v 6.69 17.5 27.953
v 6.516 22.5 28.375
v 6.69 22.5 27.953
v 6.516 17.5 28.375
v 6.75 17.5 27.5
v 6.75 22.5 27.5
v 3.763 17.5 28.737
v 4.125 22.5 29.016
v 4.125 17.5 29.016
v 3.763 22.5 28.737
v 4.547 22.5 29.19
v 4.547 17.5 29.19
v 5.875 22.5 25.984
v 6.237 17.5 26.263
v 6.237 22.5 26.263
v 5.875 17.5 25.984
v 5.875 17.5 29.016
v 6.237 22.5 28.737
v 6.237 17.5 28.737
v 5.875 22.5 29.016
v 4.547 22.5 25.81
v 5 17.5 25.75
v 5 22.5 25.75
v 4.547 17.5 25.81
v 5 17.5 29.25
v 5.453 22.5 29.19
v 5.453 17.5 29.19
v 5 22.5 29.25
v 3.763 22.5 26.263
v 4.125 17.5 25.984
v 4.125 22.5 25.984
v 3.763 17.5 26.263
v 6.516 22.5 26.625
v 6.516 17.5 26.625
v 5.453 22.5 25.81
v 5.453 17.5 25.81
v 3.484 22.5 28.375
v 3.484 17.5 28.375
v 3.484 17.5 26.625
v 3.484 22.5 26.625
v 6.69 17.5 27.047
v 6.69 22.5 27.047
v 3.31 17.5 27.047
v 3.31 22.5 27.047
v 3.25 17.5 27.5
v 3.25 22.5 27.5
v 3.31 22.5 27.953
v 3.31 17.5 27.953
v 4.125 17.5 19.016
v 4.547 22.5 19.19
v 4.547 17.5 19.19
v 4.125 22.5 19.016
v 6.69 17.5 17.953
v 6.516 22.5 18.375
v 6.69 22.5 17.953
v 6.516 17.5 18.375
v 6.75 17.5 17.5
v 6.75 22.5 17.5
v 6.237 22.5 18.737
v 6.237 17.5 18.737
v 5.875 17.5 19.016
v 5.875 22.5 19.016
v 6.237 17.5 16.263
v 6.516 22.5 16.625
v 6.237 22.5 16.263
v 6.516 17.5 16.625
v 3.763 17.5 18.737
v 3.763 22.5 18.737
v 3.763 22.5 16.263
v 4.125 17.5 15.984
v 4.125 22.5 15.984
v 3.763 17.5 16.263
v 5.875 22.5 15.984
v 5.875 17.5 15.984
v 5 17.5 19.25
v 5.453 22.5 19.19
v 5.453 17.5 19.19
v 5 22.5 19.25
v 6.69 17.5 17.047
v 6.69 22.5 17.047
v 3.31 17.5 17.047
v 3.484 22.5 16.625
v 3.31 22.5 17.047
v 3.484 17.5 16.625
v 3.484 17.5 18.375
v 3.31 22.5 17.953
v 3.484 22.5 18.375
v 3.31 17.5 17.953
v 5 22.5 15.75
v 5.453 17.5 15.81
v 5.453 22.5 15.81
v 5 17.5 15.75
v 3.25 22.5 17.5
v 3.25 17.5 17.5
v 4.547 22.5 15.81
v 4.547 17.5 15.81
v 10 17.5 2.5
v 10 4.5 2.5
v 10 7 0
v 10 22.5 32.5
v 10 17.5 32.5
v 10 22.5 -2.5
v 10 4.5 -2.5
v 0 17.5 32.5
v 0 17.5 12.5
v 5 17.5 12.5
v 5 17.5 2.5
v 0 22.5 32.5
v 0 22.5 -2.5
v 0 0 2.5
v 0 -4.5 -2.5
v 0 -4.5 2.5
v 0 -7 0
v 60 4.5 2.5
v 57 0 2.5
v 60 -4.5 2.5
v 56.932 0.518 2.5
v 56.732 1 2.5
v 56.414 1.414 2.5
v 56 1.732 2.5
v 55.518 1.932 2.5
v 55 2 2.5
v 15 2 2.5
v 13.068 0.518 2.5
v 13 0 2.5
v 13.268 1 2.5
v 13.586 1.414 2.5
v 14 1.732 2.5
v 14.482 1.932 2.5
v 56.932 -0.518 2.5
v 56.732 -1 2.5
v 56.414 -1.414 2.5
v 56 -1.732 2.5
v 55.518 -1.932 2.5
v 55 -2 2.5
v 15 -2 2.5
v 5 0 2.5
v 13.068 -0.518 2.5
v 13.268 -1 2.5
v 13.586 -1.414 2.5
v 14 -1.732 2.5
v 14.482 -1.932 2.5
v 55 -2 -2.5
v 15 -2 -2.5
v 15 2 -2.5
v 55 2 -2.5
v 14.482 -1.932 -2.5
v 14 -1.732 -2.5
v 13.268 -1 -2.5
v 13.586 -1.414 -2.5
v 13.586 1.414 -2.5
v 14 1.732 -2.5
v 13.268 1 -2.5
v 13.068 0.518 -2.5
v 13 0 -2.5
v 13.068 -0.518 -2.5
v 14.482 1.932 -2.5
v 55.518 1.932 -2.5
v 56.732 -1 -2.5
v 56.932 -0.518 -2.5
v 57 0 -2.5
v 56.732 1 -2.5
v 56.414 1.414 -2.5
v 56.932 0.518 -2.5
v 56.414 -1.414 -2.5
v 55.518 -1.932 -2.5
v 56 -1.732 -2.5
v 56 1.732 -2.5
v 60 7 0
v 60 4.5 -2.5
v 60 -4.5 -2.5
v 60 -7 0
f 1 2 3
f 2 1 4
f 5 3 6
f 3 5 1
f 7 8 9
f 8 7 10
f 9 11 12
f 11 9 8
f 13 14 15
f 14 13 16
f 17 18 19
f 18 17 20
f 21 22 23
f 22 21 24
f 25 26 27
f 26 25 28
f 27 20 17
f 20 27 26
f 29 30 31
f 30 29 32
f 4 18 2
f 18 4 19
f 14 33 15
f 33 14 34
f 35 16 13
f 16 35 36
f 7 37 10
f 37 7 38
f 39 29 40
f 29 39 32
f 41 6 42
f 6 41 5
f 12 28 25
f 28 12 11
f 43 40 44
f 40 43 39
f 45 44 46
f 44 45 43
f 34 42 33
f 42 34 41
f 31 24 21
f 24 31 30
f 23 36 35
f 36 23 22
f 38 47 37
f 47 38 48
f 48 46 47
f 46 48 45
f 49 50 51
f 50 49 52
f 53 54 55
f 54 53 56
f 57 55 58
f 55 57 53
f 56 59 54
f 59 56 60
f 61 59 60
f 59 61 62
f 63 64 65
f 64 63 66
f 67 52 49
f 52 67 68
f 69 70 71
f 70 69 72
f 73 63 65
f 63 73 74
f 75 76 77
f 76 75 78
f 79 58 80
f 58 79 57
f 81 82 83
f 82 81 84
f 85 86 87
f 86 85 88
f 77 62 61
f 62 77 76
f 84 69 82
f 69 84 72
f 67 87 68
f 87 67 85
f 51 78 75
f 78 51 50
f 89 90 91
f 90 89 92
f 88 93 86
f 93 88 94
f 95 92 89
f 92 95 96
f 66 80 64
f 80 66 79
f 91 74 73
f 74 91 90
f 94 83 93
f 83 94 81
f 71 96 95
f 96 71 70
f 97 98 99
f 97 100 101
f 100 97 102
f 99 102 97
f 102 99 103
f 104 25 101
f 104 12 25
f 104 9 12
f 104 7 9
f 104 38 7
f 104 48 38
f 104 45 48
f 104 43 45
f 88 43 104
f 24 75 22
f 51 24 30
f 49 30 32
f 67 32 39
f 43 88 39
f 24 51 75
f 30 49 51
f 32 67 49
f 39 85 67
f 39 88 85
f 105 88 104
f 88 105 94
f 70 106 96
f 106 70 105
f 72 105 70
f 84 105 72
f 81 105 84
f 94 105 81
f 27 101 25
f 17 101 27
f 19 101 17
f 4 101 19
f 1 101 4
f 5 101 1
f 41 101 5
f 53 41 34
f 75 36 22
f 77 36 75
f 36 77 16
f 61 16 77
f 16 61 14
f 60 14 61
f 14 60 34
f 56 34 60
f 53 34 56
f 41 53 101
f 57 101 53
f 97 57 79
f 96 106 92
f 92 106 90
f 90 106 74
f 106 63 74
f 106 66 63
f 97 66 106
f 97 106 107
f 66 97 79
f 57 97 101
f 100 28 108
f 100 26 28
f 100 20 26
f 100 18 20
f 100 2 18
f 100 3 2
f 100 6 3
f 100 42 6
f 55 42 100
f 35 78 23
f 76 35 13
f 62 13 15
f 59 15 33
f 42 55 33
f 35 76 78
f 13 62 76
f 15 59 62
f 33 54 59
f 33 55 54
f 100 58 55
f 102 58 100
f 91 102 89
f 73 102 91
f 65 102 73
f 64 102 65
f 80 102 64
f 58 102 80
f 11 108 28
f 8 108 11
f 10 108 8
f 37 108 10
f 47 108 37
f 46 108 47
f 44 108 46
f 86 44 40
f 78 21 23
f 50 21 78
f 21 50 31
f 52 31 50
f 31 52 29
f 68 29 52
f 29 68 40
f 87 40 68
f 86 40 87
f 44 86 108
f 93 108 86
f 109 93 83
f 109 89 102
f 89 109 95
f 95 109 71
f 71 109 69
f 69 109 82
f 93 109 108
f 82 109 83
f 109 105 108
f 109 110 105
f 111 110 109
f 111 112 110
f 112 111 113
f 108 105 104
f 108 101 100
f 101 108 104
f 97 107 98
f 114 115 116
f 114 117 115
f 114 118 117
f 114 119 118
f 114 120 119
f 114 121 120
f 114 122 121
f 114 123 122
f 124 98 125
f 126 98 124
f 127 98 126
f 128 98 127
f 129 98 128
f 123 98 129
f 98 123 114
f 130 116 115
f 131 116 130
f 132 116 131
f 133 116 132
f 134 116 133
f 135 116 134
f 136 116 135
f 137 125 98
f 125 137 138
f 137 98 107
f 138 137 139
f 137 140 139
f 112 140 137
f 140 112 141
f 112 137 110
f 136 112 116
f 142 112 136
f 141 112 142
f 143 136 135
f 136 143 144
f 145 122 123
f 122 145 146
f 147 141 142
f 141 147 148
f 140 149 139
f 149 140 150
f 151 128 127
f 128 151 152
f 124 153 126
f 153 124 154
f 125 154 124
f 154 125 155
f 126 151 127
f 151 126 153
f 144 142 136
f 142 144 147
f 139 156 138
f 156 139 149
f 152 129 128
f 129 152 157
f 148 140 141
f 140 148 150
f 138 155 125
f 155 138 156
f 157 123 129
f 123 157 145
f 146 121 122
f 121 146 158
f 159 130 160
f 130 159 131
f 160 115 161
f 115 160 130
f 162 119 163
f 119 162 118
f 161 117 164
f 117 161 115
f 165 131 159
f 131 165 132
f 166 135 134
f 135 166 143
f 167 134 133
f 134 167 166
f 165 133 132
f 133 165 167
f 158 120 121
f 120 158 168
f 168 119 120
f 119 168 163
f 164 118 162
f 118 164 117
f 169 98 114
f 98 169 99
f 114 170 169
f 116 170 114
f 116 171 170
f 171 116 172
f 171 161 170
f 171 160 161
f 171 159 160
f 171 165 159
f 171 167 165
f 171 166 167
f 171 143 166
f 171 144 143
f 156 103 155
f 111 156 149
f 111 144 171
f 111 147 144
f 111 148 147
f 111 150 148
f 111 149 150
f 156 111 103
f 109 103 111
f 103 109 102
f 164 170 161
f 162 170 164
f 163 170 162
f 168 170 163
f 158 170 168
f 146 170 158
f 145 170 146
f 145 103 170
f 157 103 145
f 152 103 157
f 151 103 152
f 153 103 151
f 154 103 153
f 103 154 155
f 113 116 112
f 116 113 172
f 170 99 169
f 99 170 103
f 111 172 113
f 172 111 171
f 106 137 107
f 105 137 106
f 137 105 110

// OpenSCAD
// (c) JPT 2014
// http://www.thingiverse.com/thing:375759

// length of rail (including arm_height)
rail_len = 60;

// length of arm from center of rail (i.e. plus/minus arm_width/2)
arm_len = 30;

// elevation of the arm from center of rail (may be negative)
arm_elevation = -20;

// Add a support between arm and rail?
support1 = true;
support2 = false;

// number of screw holes in the arm
arm_screwcount = 2;

// distance between screw holes
arm_screwdistance = 10;

// rail thickness
rail_width = 5;

// diameter of the opening for the screws
rail_screws = 4;

// rail height excluding the 45° part (so it's plus rail_width)
rail_height = 9;

// arm thickness
arm_width = 5;

arm_height = 10;

// diameter of screw holes 
arm_screws = 3.5;

// OpenScad option: how many parts should a full circle be rendered of?
$fn = 24;

s = arm_elevation > 0 ? arm_elevation + arm_width/2 : -arm_elevation + arm_width/2;
t = arm_elevation > 0 ? s/2 : -s/2;

// support
s1p0 = [arm_height/2,                          0, rail_width/2];
s1p1 = [arm_height/2, -arm_elevation-arm_width/2, rail_width/2];
s1p2 = [arm_height/2, -arm_elevation-arm_width/2, rail_width/2 + arm_len - arm_screwcount * arm_screwdistance];
s1p3 = [0  , -arm_elevation-arm_width/2, rail_width/2 + arm_len - arm_screwcount * arm_screwdistance];
s1p4 = [0  , -arm_elevation-arm_width/2, rail_width/2];
s1p5 = [0  ,                          0, rail_width/2];

s1t = [
	[2, 1, 0],
	[5, 3, 2, 0],
	[5, 4, 3],
	[0, 1, 4, 5],
	[1, 2, 3, 4]
];

if ((support1) && (abs (arm_elevation) > 4)) {

	if (arm_elevation < 0) {
		polyhedron(
			points = [s1p0, s1p1, s1p2, s1p3, s1p4, s1p5],
			triangles = s1t,
			convexity = 2
		);
	} else {
		polyhedron(
			points = [s1p5, s1p4, s1p3, s1p2, s1p1, s1p0],
			triangles = s1t,
			convexity = 2
		);
	}
}

sign = arm_elevation > 0?-1:1;
s2y=sign * rail_height/2;

s2p0 = [arm_height, -arm_elevation+arm_width/2*sign, +rail_width/2];
s2p1 = [arm_height, -arm_elevation+arm_width/2*sign, -rail_width/2];
s2p2 = [arm_height,   s2y, -rail_width/2];
s2p3 = [arm_height,   s2y, +rail_width/2];
s2p4 = [arm_height*2, s2y, +rail_width/2];
s2p5 = [arm_height*2, s2y, -rail_width/2];

s2t = [
	[0, 1, 2, 3],
	[4, 5, 1, 0],
	[5, 2, 1],
	[0, 3, 4],
	[5, 4, 3, 2]
];

if ((support2) && (abs (arm_elevation) > rail_width/2)) {
	if (arm_elevation < 0) {
		polyhedron(
//			points = [s2p0, s2p1, s2p2, s2p3, s2p4, s2p5],
			points = [s2p5, s2p4, s2p3, s2p2, s2p1, s2p0],
			triangles = s2t,
			convexity = 2
		);
	} else {
		polyhedron(
			points = [s2p0, s2p1, s2p2, s2p3, s2p4, s2p5],
//			points = [s2p5, s2p4, s2p3, s2p2, s2p1, s2p0],
			triangles = s2t,
			convexity = 2
		);
	}

}



// fix wrong placement. TODO fix all points below so this rotation is not necessary any more
rotate(a=[90,0,0]) {
	
	union() {

		translate(v=[
			arm_height/2, 
			arm_len/2 + rail_width/2, 
			arm_elevation]) {
		
		   difference() {
				// arm
				cube(size=[arm_height, arm_len, arm_width], center = true);
			
				// screw holes
				translate([0, arm_len/2 - arm_screwdistance/2,0]) 
				for (i = [0 : arm_screwcount-1] ) {
			   		translate([0, - i * arm_screwdistance, 0])
					cylinder(h = arm_width+2, r = arm_screws/2, center = true);
				}
			}
		}
		
		// arm elevation
		translate([arm_height/2, 0, t]) {
			cube(size = [arm_height, rail_width , s], center = true);
		}		
		
		// rail
		difference() {
			// rail
			polyhedron(
				points = [
					[0, -rail_width/2, -rail_height/2],
					[0,             0, -(rail_height + rail_width)/2],
					[0,  rail_width/2, -rail_height/2],
					[0,  rail_width/2,  rail_height/2],
					[0,             0, (rail_height + rail_width)/2],
					[0, -rail_width/2,  rail_height/2],
			
					[rail_len, -rail_width/2, -rail_height/2],
					[rail_len,             0, -(rail_height + rail_width)/2],
					[rail_len,  rail_width/2, -rail_height/2],
					[rail_len,  rail_width/2,  rail_height/2],
					[rail_len,             0,  (rail_height + rail_width)/2],
					[rail_len, -rail_width/2,  rail_height/2]
			
				],
				triangles = [
					[0, 1, 2, 3, 4, 5],
					[6, 7, 1, 0],
					[7, 8, 2, 1],
					[8, 9, 3, 2],
					[9,10, 4, 3],
					[10,11,5, 4],
					[11,6, 0, 5],
					[11, 10, 9, 8, 7, 6]
				], 
		
				convexity = 2
			);
		
			// rail opening
			union() {
				translate (v=[rail_len/2+5, 0, 0]) {
					cube(size = [rail_len-20,rail_width+2,rail_screws], center = true);
				}
				
				translate (v=[15, 0, 0]) {
					rotate(a=[90,0,0]) {
						cylinder(h = rail_width+2, r = rail_screws/2, center = true);
					}
				}
				
				translate (v=[rail_len-5, 0, 0]) {
					rotate(a=[90,0,0]) {
						cylinder(h = rail_width+2, r = rail_screws/2, center = true);
					}
				}
				
			}
		}
	}
};
